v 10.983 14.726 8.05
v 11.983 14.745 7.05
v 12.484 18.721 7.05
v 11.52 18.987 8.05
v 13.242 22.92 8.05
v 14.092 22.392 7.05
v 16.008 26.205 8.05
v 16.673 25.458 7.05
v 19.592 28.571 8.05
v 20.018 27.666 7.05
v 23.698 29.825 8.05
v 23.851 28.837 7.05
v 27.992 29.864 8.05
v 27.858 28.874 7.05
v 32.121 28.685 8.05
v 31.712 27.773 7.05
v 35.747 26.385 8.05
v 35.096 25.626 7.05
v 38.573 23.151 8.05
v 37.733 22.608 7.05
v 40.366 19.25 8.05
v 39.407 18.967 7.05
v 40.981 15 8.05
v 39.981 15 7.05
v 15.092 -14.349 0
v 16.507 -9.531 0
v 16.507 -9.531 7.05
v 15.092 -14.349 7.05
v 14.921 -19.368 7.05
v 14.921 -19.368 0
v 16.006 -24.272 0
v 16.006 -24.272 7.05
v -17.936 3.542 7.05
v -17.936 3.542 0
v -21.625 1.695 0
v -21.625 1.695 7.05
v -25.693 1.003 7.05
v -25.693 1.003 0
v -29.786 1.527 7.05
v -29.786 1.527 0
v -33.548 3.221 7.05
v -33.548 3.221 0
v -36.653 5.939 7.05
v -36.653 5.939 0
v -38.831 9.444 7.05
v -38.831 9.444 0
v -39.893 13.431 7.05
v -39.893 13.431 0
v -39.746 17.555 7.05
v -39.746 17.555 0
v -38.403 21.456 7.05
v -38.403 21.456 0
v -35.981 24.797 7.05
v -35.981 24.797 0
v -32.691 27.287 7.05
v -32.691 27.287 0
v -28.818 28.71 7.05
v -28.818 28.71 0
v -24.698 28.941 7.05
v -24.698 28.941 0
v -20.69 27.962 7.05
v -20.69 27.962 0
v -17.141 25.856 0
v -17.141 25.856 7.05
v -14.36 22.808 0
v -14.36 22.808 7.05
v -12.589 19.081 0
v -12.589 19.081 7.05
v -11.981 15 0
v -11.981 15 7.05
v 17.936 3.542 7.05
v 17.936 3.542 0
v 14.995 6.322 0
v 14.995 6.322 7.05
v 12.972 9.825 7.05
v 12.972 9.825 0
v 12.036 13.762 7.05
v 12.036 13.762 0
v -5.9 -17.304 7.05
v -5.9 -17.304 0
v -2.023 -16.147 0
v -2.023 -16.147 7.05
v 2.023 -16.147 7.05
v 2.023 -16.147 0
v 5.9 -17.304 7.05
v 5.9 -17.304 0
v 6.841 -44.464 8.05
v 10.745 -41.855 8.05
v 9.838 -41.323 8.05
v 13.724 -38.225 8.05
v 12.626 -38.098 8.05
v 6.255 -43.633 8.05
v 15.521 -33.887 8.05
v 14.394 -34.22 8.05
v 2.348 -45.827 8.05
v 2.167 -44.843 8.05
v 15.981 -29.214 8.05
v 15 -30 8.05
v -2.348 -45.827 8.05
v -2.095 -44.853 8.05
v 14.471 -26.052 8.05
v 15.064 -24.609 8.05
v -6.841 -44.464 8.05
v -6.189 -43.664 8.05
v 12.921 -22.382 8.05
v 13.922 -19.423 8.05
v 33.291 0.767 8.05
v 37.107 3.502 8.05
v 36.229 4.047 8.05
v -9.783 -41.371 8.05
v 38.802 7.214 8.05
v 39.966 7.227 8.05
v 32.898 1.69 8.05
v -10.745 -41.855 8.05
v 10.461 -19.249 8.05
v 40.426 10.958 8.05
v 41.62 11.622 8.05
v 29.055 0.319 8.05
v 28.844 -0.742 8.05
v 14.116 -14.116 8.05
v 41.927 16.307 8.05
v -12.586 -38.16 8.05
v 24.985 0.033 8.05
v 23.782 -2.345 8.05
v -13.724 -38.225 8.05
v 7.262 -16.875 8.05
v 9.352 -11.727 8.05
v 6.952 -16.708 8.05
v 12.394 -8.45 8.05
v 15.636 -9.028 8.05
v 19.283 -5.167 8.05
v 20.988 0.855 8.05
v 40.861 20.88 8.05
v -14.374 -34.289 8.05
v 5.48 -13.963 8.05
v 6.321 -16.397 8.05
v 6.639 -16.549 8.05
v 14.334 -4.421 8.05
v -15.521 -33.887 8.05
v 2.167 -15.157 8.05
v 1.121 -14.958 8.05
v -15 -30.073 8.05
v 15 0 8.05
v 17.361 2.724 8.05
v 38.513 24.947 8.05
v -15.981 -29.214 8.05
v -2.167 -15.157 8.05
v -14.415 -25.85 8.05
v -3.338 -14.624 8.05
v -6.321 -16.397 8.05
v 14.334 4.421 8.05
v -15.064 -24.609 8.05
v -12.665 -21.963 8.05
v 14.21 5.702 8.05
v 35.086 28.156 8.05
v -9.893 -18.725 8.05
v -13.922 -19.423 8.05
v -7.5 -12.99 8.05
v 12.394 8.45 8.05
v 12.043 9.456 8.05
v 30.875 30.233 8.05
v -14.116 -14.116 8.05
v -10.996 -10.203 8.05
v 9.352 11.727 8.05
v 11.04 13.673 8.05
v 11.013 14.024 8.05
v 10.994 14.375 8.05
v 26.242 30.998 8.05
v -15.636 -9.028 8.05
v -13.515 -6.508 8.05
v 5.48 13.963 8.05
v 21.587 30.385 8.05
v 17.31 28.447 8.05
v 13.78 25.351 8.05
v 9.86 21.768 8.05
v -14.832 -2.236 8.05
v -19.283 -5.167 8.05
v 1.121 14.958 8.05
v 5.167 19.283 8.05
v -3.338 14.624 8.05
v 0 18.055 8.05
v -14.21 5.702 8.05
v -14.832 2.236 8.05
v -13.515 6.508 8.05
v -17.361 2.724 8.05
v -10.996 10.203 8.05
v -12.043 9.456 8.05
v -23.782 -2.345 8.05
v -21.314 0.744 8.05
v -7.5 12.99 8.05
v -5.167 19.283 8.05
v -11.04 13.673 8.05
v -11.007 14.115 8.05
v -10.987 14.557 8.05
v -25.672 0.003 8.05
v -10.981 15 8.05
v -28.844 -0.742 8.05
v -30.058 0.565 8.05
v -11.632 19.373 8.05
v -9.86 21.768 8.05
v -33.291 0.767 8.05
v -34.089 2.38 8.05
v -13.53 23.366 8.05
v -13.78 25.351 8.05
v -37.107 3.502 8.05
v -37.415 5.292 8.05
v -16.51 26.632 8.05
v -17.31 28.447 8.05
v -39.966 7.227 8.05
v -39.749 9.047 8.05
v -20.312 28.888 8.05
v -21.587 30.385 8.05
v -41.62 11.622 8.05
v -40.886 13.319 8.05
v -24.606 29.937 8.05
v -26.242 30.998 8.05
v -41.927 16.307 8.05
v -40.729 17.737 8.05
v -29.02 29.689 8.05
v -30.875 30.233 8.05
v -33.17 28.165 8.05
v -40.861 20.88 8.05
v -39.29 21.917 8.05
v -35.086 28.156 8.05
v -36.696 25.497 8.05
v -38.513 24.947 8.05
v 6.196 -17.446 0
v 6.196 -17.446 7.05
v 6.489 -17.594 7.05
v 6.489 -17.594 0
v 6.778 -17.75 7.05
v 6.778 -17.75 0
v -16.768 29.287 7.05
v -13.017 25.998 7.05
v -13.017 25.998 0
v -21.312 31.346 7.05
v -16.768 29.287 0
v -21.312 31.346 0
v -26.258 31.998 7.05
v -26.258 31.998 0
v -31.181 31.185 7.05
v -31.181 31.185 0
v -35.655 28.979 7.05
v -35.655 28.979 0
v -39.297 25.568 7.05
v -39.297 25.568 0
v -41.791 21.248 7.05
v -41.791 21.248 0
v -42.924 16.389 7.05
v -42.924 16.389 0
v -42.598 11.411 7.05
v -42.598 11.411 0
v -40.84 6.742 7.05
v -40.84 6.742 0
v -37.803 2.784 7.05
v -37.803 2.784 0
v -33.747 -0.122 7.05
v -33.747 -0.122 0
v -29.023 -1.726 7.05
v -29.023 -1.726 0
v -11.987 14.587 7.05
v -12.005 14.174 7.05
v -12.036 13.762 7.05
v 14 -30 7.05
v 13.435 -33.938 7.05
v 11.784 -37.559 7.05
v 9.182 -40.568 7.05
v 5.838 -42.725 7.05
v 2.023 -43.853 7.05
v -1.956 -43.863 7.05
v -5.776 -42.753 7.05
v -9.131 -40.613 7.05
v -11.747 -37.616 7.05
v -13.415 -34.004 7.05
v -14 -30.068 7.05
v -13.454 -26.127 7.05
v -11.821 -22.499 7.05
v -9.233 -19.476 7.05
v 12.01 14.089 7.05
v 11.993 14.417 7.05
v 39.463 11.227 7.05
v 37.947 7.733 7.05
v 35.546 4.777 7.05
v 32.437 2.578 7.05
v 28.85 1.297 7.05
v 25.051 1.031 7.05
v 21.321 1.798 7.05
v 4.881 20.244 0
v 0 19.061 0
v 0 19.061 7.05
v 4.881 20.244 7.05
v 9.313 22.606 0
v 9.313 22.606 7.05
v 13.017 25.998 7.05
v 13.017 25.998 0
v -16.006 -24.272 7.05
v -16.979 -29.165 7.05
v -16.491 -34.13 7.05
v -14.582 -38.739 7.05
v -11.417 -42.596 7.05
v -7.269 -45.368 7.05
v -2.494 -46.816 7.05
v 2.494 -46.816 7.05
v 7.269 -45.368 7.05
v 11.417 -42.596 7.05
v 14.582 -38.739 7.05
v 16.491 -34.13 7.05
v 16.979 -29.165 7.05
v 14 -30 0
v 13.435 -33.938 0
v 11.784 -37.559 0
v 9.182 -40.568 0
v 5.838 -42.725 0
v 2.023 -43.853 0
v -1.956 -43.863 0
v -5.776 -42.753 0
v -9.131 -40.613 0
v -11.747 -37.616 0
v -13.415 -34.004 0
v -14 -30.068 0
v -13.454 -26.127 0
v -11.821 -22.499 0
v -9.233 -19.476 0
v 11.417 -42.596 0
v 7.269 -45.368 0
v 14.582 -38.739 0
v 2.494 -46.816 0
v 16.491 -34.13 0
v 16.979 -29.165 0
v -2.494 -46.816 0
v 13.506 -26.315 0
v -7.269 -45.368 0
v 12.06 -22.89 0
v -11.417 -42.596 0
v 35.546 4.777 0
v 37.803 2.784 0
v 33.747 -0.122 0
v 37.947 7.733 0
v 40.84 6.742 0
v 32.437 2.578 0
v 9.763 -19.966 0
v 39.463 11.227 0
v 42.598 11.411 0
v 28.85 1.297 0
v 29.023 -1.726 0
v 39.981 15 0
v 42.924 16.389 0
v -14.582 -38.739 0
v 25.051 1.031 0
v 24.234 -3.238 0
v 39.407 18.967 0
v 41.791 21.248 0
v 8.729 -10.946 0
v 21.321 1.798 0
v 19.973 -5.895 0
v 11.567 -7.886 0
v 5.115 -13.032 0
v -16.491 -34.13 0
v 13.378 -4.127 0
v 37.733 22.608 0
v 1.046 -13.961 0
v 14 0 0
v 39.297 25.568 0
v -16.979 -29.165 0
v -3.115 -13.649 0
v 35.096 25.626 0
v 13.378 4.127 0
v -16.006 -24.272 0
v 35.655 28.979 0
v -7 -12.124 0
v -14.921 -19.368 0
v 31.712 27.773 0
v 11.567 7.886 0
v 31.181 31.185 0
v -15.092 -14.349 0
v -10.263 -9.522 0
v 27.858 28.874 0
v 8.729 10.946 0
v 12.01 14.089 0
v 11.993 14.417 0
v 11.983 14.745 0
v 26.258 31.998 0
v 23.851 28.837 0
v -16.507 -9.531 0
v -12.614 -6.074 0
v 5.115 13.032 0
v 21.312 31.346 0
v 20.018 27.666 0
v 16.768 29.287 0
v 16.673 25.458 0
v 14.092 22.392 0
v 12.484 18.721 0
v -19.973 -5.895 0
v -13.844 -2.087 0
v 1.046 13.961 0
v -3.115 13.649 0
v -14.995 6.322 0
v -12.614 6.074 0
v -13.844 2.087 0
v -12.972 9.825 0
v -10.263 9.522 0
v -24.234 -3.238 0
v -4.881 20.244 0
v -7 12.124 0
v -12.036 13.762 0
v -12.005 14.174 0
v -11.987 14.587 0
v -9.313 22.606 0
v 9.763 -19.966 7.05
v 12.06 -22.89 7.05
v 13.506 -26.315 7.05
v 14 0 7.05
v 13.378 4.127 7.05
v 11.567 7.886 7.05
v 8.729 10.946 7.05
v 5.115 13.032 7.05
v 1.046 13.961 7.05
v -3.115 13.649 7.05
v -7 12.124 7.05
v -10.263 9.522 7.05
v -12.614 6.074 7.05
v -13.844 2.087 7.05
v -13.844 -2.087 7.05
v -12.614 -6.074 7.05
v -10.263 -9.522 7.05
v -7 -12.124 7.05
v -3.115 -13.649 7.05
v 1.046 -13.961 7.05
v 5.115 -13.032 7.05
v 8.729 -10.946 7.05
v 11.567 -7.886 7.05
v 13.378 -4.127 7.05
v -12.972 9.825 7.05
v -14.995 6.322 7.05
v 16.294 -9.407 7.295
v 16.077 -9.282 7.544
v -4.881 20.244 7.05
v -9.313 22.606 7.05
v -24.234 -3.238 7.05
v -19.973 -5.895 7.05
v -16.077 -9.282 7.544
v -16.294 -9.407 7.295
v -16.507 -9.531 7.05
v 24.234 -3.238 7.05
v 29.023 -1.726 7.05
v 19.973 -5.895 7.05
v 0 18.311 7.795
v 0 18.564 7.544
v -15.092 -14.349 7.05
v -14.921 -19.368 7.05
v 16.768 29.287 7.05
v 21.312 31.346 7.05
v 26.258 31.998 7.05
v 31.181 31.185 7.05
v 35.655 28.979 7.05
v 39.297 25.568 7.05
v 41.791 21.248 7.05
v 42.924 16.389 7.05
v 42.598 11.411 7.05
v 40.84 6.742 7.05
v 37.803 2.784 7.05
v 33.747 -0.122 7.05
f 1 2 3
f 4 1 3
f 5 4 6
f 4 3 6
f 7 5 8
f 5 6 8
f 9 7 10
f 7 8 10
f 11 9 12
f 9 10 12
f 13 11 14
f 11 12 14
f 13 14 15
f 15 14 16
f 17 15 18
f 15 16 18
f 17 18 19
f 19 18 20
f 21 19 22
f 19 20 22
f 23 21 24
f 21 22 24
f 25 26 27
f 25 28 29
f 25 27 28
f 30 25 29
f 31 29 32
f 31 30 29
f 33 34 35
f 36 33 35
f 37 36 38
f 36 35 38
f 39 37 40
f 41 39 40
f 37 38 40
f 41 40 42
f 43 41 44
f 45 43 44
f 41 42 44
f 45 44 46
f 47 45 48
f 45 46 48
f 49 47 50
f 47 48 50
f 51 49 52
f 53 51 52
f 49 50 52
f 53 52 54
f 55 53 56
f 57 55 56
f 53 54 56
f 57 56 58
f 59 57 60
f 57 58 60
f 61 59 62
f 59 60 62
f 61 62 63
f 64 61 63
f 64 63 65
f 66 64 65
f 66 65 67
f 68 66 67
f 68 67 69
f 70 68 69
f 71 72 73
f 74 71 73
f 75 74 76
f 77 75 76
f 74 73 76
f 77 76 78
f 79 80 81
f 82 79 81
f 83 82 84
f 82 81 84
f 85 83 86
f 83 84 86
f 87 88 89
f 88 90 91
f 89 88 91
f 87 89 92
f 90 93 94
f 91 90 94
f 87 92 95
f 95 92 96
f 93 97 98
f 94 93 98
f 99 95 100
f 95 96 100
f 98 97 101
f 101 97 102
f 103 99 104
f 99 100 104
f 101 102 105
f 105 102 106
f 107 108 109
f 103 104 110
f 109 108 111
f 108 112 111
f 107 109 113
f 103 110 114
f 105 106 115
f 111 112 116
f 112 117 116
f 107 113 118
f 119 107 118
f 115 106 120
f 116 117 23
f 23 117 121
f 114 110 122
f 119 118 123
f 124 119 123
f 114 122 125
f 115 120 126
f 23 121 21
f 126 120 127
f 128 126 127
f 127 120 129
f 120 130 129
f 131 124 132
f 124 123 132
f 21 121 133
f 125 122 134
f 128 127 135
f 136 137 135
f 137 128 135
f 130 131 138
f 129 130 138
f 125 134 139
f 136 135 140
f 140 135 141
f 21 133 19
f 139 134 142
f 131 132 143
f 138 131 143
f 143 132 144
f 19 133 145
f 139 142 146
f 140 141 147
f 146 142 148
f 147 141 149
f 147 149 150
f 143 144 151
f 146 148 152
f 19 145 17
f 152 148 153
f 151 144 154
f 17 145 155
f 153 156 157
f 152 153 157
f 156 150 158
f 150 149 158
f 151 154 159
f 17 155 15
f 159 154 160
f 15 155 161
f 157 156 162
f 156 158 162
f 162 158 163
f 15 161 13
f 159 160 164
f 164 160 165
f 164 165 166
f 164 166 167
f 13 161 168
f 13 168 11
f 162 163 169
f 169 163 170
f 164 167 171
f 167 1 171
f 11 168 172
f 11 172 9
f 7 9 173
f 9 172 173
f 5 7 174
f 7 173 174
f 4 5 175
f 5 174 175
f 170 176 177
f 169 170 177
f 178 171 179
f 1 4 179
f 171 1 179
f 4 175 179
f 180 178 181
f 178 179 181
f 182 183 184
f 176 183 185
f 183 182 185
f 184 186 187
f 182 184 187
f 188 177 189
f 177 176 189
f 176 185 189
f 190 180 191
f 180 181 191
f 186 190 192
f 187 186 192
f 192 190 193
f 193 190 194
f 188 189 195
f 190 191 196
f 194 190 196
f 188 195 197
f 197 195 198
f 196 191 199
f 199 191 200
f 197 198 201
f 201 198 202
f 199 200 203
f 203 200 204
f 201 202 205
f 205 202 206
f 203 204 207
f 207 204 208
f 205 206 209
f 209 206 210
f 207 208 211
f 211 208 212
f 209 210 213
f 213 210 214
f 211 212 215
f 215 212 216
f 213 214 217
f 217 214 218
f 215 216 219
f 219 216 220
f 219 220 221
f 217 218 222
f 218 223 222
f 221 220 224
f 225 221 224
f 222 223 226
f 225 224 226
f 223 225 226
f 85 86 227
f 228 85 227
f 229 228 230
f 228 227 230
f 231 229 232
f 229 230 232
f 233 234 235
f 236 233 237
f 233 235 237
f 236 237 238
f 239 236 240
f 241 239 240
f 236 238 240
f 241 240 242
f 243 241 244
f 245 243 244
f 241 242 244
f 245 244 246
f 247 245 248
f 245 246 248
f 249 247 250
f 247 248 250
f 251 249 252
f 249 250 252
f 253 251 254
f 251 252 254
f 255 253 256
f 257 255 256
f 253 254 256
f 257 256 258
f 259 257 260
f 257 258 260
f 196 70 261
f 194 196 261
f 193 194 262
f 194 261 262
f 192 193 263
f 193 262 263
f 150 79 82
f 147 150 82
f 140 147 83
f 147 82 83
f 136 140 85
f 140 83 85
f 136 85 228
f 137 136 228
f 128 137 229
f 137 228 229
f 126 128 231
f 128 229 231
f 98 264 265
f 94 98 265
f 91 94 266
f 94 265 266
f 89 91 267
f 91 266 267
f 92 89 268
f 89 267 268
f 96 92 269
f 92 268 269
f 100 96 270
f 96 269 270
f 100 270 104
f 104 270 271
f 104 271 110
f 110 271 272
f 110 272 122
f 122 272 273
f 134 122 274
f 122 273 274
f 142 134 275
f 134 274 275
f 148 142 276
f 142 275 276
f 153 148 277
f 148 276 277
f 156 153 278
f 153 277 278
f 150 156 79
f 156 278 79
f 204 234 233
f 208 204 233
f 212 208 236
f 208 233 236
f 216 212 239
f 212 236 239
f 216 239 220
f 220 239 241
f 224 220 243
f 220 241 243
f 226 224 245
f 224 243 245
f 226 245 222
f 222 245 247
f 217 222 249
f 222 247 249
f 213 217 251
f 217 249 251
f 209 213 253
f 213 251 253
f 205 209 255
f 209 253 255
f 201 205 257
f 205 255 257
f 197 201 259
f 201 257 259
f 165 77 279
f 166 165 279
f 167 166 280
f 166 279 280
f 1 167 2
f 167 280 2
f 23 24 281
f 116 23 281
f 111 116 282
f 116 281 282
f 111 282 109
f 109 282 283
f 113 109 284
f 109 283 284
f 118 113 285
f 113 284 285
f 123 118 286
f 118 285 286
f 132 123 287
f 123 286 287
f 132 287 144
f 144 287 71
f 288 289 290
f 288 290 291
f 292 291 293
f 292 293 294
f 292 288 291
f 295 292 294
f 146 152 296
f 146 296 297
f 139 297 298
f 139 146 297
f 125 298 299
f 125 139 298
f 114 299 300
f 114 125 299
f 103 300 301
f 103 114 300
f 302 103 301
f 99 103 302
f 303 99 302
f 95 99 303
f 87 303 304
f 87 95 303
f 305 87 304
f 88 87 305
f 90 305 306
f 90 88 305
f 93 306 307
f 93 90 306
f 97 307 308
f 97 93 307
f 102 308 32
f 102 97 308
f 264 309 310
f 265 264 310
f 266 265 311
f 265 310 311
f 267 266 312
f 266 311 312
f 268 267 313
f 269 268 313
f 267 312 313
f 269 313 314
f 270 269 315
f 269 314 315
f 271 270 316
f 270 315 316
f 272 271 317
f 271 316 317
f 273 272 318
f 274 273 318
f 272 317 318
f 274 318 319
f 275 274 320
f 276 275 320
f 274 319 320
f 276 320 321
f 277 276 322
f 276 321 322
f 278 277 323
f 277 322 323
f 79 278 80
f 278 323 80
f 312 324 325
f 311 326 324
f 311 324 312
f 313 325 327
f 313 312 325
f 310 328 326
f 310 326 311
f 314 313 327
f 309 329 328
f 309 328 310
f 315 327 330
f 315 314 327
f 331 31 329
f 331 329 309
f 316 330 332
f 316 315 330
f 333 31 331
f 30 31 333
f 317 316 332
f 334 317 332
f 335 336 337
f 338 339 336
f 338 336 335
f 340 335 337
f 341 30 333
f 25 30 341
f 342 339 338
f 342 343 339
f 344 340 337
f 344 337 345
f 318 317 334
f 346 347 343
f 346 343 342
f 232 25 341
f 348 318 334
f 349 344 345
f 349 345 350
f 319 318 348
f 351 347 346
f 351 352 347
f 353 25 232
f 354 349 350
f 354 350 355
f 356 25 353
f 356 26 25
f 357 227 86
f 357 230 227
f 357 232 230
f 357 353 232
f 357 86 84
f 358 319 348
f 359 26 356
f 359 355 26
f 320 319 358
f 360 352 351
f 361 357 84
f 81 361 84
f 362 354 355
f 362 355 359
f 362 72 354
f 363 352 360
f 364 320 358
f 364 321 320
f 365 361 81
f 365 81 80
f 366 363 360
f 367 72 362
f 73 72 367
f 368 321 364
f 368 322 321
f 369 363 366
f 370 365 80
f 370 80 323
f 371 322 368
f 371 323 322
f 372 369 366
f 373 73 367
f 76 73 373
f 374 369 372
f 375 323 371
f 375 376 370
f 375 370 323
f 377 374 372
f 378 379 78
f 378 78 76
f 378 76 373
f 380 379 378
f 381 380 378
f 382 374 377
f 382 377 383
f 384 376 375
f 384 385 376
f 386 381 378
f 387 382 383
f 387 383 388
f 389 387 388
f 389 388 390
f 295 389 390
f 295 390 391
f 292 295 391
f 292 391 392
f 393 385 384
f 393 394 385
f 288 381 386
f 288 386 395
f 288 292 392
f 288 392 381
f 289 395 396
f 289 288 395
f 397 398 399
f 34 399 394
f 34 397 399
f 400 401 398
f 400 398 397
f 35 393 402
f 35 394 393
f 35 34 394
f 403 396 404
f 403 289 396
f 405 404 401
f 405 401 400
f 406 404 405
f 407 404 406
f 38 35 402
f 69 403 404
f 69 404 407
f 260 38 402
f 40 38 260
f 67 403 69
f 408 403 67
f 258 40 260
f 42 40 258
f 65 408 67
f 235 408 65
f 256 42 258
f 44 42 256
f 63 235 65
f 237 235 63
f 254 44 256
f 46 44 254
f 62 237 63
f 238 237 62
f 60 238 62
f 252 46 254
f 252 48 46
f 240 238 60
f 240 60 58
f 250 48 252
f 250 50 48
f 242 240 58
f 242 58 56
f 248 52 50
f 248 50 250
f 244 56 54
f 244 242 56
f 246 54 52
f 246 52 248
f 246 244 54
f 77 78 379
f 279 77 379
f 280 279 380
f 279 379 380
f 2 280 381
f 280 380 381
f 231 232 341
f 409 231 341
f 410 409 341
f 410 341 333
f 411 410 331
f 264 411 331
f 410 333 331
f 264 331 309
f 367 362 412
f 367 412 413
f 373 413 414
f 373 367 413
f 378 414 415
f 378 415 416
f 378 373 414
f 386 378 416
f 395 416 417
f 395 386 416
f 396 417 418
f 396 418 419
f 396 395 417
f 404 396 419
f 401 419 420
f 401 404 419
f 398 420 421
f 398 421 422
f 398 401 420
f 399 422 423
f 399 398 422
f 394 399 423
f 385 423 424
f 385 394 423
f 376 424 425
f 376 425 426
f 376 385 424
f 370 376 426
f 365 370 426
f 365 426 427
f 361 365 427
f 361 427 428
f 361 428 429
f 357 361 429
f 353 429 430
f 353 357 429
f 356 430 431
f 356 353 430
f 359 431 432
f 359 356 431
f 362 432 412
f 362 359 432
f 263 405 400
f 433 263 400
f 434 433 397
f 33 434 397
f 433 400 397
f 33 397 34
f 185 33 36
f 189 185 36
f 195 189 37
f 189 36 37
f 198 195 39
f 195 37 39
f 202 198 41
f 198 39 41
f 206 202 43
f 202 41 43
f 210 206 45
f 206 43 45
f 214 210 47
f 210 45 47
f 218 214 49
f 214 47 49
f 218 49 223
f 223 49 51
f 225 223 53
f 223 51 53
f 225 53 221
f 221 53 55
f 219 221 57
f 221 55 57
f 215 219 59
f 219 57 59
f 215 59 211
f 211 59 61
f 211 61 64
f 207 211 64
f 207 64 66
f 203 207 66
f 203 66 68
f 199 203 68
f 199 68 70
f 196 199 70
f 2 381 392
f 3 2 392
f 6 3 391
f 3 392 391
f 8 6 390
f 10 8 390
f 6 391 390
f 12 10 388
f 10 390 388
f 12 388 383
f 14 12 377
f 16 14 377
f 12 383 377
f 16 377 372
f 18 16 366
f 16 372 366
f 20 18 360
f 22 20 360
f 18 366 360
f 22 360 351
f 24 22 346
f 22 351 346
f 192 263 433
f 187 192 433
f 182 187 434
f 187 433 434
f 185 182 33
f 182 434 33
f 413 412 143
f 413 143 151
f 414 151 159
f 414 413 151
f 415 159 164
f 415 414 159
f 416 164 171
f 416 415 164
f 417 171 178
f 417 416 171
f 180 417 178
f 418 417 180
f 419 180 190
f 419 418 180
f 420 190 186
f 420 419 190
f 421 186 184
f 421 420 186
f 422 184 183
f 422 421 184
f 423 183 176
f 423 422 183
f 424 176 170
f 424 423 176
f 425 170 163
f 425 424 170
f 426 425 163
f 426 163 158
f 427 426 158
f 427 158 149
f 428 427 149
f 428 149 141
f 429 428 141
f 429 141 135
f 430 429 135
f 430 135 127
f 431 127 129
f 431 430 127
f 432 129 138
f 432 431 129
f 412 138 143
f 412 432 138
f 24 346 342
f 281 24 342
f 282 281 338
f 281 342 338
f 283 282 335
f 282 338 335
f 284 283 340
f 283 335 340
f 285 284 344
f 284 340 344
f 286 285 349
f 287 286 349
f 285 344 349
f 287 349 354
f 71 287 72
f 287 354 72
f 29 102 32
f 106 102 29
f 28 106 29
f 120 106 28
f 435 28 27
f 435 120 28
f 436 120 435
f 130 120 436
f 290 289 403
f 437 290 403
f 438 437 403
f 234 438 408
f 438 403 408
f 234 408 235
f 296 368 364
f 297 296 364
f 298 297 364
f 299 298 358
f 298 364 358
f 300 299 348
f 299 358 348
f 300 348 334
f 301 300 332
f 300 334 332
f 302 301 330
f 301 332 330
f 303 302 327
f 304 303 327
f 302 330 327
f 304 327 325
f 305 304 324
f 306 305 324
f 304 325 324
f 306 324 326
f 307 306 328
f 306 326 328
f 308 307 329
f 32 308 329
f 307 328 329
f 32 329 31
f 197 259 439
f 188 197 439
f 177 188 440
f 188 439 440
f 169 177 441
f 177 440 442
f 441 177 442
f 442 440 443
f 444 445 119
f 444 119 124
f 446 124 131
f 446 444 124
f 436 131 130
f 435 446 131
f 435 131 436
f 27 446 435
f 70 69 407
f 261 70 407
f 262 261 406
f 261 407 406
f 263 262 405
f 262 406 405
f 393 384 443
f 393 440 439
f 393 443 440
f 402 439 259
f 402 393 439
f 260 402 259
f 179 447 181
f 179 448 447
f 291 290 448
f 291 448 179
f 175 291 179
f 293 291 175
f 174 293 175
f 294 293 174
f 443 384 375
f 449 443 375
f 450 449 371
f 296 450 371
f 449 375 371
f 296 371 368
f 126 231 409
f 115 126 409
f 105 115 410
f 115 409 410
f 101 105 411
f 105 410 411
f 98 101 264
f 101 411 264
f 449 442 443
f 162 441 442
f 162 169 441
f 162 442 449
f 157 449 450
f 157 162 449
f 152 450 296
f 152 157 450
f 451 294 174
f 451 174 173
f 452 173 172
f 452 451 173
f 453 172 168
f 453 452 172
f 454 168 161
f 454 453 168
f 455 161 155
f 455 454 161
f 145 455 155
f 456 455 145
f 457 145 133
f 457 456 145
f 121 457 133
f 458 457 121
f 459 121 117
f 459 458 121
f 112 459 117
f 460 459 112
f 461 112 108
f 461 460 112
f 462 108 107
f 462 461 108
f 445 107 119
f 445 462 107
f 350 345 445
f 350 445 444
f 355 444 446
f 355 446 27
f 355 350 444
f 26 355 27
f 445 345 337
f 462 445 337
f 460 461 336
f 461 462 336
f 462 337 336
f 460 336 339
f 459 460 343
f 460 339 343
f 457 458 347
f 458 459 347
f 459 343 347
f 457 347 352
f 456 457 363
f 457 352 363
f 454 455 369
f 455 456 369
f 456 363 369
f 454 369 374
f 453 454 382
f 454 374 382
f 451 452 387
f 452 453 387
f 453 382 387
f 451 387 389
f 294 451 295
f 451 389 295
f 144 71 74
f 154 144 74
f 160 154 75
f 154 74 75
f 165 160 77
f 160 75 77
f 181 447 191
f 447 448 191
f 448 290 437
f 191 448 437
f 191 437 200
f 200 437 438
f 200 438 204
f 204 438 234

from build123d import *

# Parameters (mm, degrees)
F0_R        = 14
F1_DEPTH    = 8.05
F2_T1_DEPTH = 8.05
F3_SIZE     = 0.99999


# Not quite as in the source:
# - a fillet or chamfer that OpenCascade refuses, or shapes differently, is made with other operations: its cross-section is extruded or revolved along the edge and cut away or added
# - a fillet or chamfer is up to 0.001 mm smaller than in the source, because OpenCascade refuses the exact size


with BuildPart() as f1:
    # F0 (on Top) → F1 (new body)
    with BuildSketch(Plane.XY):
        with BuildLine():
            ThreePointArc((-18.9934809997, -0.4976741041), (-16.4544826719, -9.5), (-9.9277389168, -16.2))
            ThreePointArc((-9.9277389168, -16.2), (0, -47), (9.9277389168, -16.2))
            ThreePointArc((9.9277389168, -16.2), (16.4544826719, -9.5), (18.9934809997, -0.4976741041))
            ThreePointArc((18.9934809997, -0.4976741041), (40.7031939779, 23.5), (9.0657420829, 16.6976741041))
            ThreePointArc((9.0657420829, 16.6976741041), (0, 19), (-9.0657420829, 16.6976741041))
            ThreePointArc((-9.0657420829, 16.6976741041), (-40.7031939779, 23.5), (-18.9934809997, -0.4976741041))
        make_face()
        with BuildLine():
            ThreePointArc((5.9, -17.3039376183), (6.3427828622, -17.5192506009), (6.7777208559, -17.75))
            ThreePointArc((6.7777208559, -17.75), (12.0600184905, -22.8897289778), (14, -30))
            ThreePointArc((14, -30), (-7.5299402388, -41.8025420991), (-5.9, -17.3039376183))
            ThreePointArc((-5.9, -17.3039376183), (0, -16), (5.9, -17.3039376183))
        make_face(mode=Mode.SUBTRACT)
        with BuildLine():
            ThreePointArc((-17.9356495629, 3.5424189268), (-38.4031526988, 21.4563311676), (-11.9807621135, 15))
            ThreePointArc((-11.9807621135, 15), (-11.9944907071, 14.3801515137), (-12.0356495629, 13.7615186915))
            ThreePointArc((-12.0356495629, 13.7615186915), (-13.8564064606, 8), (-17.9356495629, 3.5424189268))
        make_face(mode=Mode.SUBTRACT)
        Circle(F0_R, mode=Mode.SUBTRACT)
        with BuildLine():
            ThreePointArc((11.9830904892, 14.7446784409), (25.8530960258, 28.999417894), (39.9807621135, 15))
            ThreePointArc((39.9807621135, 15), (32.4370932811, 2.5776094147), (17.9356495629, 3.5424189268))
            ThreePointArc((17.9356495629, 3.5424189268), (13.8564064606, 8), (12.0356495629, 13.7615186915))
            ThreePointArc((12.0356495629, 13.7615186915), (12.0007246446, 14.2526363898), (11.9830904892, 14.7446784409))
        make_face(mode=Mode.SUBTRACT)
    extrude(amount=F1_DEPTH)

    # F2: fillet of radius 20 on 6 edges, made by hand

    # F2_s2 → F2_t1 (join)
    with BuildSketch(Plane.XY):
        with BuildLine():
            ThreePointArc((-15.8833011878, -10.4269239653), (-21.5600561339, -4.7274127209), (-29.0232123622, -1.725534266))
            ThreePointArc((-29.0232123622, -1.725534266), (-23.9150097608, -1.8740234448), (-18.9934809997, -0.4976741041))
            ThreePointArc((-18.9934809997, -0.4976741041), (-18.1313260585, -5.6793499065), (-15.8833011878, -10.4269239653))
        make_face()
        with BuildLine():
            ThreePointArc((-16.9716316312, -8.5418803419), (-14.8740875774, -16.3078499586), (-16.0059626906, -24.2720720721))
            ThreePointArc((-16.0059626906, -24.2720720721), (-13.5804567909, -19.7739942621), (-9.9277389168, -16.2))
            ThreePointArc((-9.9277389168, -16.2), (-13.9841243252, -12.8625140177), (-16.9716316312, -8.5418803419))
        make_face()
        with BuildLine():
            ThreePointArc((-1.0883304434, 18.9688043072), (6.6859685565, 21.0352626795), (13.0172496716, 25.9976063381))
            ThreePointArc((13.0172496716, 25.9976063381), (10.3345529699, 21.648017707), (9.0657420829, 16.6976741041))
            ThreePointArc((9.0657420829, 16.6976741041), (4.1472017333, 18.5418639242), (-1.0883304434, 18.9688043072))
        make_face()
        with BuildLine():
            ThreePointArc((1.0883304434, 18.9688043072), (-6.6859685565, 21.0352626795), (-13.0172496716, 25.9976063381))
            ThreePointArc((-13.0172496716, 25.9976063381), (-10.3345529699, 21.648017707), (-9.0657420829, 16.6976741041))
            ThreePointArc((-9.0657420829, 16.6976741041), (-4.1472017333, 18.5418639242), (1.0883304434, 18.9688043072))
        make_face()
        with BuildLine():
            ThreePointArc((29.0232123622, -1.725534266), (21.5600561339, -4.7274127209), (15.8833011878, -10.4269239653))
            ThreePointArc((15.8833011878, -10.4269239653), (18.1313260585, -5.6793499065), (18.9934809997, -0.4976741041))
            ThreePointArc((18.9934809997, -0.4976741041), (23.9150097608, -1.8740234448), (29.0232123622, -1.725534266))
        make_face()
        with BuildLine():
            ThreePointArc((16.9716316312, -8.5418803419), (14.8740875774, -16.3078499586), (16.0059626906, -24.2720720721))
            ThreePointArc((16.0059626906, -24.2720720721), (13.5804567909, -19.7739942621), (9.9277389168, -16.2))
            ThreePointArc((9.9277389168, -16.2), (13.9841243252, -12.8625140177), (16.9716316312, -8.5418803419))
        make_face()
    extrude(amount=F2_T1_DEPTH)

    # F3 (size 1 in the source; OpenCascade refuses exactly that, so slightly less here)
    f3_edges = [f1.edges().sort_by_distance(p)[0] for p in [
        (0, -47, 8.05),
        (14.848068, -16.8534, 8.05),
        (22.019507, -4.432104, 8.05),
        (40.703194, 23.5, 8.05),
        (7.171439, 21.285504, 8.05),
        (-7.171439, 21.285504, 8.05),
        (-40.703194, 23.5, 8.05),
        (-22.019507, -4.432104, 8.05),
        (-14.848068, -16.8534, 8.05),
        (5.9, -42.696062, 8.05),
        (-39.980762, 15, 8.05),
        (-14, 0, 8.05),
        (11.980762, 15, 8.05),
    ]]
    chamfer(f3_edges, length=F3_SIZE)


solid = f1.part
